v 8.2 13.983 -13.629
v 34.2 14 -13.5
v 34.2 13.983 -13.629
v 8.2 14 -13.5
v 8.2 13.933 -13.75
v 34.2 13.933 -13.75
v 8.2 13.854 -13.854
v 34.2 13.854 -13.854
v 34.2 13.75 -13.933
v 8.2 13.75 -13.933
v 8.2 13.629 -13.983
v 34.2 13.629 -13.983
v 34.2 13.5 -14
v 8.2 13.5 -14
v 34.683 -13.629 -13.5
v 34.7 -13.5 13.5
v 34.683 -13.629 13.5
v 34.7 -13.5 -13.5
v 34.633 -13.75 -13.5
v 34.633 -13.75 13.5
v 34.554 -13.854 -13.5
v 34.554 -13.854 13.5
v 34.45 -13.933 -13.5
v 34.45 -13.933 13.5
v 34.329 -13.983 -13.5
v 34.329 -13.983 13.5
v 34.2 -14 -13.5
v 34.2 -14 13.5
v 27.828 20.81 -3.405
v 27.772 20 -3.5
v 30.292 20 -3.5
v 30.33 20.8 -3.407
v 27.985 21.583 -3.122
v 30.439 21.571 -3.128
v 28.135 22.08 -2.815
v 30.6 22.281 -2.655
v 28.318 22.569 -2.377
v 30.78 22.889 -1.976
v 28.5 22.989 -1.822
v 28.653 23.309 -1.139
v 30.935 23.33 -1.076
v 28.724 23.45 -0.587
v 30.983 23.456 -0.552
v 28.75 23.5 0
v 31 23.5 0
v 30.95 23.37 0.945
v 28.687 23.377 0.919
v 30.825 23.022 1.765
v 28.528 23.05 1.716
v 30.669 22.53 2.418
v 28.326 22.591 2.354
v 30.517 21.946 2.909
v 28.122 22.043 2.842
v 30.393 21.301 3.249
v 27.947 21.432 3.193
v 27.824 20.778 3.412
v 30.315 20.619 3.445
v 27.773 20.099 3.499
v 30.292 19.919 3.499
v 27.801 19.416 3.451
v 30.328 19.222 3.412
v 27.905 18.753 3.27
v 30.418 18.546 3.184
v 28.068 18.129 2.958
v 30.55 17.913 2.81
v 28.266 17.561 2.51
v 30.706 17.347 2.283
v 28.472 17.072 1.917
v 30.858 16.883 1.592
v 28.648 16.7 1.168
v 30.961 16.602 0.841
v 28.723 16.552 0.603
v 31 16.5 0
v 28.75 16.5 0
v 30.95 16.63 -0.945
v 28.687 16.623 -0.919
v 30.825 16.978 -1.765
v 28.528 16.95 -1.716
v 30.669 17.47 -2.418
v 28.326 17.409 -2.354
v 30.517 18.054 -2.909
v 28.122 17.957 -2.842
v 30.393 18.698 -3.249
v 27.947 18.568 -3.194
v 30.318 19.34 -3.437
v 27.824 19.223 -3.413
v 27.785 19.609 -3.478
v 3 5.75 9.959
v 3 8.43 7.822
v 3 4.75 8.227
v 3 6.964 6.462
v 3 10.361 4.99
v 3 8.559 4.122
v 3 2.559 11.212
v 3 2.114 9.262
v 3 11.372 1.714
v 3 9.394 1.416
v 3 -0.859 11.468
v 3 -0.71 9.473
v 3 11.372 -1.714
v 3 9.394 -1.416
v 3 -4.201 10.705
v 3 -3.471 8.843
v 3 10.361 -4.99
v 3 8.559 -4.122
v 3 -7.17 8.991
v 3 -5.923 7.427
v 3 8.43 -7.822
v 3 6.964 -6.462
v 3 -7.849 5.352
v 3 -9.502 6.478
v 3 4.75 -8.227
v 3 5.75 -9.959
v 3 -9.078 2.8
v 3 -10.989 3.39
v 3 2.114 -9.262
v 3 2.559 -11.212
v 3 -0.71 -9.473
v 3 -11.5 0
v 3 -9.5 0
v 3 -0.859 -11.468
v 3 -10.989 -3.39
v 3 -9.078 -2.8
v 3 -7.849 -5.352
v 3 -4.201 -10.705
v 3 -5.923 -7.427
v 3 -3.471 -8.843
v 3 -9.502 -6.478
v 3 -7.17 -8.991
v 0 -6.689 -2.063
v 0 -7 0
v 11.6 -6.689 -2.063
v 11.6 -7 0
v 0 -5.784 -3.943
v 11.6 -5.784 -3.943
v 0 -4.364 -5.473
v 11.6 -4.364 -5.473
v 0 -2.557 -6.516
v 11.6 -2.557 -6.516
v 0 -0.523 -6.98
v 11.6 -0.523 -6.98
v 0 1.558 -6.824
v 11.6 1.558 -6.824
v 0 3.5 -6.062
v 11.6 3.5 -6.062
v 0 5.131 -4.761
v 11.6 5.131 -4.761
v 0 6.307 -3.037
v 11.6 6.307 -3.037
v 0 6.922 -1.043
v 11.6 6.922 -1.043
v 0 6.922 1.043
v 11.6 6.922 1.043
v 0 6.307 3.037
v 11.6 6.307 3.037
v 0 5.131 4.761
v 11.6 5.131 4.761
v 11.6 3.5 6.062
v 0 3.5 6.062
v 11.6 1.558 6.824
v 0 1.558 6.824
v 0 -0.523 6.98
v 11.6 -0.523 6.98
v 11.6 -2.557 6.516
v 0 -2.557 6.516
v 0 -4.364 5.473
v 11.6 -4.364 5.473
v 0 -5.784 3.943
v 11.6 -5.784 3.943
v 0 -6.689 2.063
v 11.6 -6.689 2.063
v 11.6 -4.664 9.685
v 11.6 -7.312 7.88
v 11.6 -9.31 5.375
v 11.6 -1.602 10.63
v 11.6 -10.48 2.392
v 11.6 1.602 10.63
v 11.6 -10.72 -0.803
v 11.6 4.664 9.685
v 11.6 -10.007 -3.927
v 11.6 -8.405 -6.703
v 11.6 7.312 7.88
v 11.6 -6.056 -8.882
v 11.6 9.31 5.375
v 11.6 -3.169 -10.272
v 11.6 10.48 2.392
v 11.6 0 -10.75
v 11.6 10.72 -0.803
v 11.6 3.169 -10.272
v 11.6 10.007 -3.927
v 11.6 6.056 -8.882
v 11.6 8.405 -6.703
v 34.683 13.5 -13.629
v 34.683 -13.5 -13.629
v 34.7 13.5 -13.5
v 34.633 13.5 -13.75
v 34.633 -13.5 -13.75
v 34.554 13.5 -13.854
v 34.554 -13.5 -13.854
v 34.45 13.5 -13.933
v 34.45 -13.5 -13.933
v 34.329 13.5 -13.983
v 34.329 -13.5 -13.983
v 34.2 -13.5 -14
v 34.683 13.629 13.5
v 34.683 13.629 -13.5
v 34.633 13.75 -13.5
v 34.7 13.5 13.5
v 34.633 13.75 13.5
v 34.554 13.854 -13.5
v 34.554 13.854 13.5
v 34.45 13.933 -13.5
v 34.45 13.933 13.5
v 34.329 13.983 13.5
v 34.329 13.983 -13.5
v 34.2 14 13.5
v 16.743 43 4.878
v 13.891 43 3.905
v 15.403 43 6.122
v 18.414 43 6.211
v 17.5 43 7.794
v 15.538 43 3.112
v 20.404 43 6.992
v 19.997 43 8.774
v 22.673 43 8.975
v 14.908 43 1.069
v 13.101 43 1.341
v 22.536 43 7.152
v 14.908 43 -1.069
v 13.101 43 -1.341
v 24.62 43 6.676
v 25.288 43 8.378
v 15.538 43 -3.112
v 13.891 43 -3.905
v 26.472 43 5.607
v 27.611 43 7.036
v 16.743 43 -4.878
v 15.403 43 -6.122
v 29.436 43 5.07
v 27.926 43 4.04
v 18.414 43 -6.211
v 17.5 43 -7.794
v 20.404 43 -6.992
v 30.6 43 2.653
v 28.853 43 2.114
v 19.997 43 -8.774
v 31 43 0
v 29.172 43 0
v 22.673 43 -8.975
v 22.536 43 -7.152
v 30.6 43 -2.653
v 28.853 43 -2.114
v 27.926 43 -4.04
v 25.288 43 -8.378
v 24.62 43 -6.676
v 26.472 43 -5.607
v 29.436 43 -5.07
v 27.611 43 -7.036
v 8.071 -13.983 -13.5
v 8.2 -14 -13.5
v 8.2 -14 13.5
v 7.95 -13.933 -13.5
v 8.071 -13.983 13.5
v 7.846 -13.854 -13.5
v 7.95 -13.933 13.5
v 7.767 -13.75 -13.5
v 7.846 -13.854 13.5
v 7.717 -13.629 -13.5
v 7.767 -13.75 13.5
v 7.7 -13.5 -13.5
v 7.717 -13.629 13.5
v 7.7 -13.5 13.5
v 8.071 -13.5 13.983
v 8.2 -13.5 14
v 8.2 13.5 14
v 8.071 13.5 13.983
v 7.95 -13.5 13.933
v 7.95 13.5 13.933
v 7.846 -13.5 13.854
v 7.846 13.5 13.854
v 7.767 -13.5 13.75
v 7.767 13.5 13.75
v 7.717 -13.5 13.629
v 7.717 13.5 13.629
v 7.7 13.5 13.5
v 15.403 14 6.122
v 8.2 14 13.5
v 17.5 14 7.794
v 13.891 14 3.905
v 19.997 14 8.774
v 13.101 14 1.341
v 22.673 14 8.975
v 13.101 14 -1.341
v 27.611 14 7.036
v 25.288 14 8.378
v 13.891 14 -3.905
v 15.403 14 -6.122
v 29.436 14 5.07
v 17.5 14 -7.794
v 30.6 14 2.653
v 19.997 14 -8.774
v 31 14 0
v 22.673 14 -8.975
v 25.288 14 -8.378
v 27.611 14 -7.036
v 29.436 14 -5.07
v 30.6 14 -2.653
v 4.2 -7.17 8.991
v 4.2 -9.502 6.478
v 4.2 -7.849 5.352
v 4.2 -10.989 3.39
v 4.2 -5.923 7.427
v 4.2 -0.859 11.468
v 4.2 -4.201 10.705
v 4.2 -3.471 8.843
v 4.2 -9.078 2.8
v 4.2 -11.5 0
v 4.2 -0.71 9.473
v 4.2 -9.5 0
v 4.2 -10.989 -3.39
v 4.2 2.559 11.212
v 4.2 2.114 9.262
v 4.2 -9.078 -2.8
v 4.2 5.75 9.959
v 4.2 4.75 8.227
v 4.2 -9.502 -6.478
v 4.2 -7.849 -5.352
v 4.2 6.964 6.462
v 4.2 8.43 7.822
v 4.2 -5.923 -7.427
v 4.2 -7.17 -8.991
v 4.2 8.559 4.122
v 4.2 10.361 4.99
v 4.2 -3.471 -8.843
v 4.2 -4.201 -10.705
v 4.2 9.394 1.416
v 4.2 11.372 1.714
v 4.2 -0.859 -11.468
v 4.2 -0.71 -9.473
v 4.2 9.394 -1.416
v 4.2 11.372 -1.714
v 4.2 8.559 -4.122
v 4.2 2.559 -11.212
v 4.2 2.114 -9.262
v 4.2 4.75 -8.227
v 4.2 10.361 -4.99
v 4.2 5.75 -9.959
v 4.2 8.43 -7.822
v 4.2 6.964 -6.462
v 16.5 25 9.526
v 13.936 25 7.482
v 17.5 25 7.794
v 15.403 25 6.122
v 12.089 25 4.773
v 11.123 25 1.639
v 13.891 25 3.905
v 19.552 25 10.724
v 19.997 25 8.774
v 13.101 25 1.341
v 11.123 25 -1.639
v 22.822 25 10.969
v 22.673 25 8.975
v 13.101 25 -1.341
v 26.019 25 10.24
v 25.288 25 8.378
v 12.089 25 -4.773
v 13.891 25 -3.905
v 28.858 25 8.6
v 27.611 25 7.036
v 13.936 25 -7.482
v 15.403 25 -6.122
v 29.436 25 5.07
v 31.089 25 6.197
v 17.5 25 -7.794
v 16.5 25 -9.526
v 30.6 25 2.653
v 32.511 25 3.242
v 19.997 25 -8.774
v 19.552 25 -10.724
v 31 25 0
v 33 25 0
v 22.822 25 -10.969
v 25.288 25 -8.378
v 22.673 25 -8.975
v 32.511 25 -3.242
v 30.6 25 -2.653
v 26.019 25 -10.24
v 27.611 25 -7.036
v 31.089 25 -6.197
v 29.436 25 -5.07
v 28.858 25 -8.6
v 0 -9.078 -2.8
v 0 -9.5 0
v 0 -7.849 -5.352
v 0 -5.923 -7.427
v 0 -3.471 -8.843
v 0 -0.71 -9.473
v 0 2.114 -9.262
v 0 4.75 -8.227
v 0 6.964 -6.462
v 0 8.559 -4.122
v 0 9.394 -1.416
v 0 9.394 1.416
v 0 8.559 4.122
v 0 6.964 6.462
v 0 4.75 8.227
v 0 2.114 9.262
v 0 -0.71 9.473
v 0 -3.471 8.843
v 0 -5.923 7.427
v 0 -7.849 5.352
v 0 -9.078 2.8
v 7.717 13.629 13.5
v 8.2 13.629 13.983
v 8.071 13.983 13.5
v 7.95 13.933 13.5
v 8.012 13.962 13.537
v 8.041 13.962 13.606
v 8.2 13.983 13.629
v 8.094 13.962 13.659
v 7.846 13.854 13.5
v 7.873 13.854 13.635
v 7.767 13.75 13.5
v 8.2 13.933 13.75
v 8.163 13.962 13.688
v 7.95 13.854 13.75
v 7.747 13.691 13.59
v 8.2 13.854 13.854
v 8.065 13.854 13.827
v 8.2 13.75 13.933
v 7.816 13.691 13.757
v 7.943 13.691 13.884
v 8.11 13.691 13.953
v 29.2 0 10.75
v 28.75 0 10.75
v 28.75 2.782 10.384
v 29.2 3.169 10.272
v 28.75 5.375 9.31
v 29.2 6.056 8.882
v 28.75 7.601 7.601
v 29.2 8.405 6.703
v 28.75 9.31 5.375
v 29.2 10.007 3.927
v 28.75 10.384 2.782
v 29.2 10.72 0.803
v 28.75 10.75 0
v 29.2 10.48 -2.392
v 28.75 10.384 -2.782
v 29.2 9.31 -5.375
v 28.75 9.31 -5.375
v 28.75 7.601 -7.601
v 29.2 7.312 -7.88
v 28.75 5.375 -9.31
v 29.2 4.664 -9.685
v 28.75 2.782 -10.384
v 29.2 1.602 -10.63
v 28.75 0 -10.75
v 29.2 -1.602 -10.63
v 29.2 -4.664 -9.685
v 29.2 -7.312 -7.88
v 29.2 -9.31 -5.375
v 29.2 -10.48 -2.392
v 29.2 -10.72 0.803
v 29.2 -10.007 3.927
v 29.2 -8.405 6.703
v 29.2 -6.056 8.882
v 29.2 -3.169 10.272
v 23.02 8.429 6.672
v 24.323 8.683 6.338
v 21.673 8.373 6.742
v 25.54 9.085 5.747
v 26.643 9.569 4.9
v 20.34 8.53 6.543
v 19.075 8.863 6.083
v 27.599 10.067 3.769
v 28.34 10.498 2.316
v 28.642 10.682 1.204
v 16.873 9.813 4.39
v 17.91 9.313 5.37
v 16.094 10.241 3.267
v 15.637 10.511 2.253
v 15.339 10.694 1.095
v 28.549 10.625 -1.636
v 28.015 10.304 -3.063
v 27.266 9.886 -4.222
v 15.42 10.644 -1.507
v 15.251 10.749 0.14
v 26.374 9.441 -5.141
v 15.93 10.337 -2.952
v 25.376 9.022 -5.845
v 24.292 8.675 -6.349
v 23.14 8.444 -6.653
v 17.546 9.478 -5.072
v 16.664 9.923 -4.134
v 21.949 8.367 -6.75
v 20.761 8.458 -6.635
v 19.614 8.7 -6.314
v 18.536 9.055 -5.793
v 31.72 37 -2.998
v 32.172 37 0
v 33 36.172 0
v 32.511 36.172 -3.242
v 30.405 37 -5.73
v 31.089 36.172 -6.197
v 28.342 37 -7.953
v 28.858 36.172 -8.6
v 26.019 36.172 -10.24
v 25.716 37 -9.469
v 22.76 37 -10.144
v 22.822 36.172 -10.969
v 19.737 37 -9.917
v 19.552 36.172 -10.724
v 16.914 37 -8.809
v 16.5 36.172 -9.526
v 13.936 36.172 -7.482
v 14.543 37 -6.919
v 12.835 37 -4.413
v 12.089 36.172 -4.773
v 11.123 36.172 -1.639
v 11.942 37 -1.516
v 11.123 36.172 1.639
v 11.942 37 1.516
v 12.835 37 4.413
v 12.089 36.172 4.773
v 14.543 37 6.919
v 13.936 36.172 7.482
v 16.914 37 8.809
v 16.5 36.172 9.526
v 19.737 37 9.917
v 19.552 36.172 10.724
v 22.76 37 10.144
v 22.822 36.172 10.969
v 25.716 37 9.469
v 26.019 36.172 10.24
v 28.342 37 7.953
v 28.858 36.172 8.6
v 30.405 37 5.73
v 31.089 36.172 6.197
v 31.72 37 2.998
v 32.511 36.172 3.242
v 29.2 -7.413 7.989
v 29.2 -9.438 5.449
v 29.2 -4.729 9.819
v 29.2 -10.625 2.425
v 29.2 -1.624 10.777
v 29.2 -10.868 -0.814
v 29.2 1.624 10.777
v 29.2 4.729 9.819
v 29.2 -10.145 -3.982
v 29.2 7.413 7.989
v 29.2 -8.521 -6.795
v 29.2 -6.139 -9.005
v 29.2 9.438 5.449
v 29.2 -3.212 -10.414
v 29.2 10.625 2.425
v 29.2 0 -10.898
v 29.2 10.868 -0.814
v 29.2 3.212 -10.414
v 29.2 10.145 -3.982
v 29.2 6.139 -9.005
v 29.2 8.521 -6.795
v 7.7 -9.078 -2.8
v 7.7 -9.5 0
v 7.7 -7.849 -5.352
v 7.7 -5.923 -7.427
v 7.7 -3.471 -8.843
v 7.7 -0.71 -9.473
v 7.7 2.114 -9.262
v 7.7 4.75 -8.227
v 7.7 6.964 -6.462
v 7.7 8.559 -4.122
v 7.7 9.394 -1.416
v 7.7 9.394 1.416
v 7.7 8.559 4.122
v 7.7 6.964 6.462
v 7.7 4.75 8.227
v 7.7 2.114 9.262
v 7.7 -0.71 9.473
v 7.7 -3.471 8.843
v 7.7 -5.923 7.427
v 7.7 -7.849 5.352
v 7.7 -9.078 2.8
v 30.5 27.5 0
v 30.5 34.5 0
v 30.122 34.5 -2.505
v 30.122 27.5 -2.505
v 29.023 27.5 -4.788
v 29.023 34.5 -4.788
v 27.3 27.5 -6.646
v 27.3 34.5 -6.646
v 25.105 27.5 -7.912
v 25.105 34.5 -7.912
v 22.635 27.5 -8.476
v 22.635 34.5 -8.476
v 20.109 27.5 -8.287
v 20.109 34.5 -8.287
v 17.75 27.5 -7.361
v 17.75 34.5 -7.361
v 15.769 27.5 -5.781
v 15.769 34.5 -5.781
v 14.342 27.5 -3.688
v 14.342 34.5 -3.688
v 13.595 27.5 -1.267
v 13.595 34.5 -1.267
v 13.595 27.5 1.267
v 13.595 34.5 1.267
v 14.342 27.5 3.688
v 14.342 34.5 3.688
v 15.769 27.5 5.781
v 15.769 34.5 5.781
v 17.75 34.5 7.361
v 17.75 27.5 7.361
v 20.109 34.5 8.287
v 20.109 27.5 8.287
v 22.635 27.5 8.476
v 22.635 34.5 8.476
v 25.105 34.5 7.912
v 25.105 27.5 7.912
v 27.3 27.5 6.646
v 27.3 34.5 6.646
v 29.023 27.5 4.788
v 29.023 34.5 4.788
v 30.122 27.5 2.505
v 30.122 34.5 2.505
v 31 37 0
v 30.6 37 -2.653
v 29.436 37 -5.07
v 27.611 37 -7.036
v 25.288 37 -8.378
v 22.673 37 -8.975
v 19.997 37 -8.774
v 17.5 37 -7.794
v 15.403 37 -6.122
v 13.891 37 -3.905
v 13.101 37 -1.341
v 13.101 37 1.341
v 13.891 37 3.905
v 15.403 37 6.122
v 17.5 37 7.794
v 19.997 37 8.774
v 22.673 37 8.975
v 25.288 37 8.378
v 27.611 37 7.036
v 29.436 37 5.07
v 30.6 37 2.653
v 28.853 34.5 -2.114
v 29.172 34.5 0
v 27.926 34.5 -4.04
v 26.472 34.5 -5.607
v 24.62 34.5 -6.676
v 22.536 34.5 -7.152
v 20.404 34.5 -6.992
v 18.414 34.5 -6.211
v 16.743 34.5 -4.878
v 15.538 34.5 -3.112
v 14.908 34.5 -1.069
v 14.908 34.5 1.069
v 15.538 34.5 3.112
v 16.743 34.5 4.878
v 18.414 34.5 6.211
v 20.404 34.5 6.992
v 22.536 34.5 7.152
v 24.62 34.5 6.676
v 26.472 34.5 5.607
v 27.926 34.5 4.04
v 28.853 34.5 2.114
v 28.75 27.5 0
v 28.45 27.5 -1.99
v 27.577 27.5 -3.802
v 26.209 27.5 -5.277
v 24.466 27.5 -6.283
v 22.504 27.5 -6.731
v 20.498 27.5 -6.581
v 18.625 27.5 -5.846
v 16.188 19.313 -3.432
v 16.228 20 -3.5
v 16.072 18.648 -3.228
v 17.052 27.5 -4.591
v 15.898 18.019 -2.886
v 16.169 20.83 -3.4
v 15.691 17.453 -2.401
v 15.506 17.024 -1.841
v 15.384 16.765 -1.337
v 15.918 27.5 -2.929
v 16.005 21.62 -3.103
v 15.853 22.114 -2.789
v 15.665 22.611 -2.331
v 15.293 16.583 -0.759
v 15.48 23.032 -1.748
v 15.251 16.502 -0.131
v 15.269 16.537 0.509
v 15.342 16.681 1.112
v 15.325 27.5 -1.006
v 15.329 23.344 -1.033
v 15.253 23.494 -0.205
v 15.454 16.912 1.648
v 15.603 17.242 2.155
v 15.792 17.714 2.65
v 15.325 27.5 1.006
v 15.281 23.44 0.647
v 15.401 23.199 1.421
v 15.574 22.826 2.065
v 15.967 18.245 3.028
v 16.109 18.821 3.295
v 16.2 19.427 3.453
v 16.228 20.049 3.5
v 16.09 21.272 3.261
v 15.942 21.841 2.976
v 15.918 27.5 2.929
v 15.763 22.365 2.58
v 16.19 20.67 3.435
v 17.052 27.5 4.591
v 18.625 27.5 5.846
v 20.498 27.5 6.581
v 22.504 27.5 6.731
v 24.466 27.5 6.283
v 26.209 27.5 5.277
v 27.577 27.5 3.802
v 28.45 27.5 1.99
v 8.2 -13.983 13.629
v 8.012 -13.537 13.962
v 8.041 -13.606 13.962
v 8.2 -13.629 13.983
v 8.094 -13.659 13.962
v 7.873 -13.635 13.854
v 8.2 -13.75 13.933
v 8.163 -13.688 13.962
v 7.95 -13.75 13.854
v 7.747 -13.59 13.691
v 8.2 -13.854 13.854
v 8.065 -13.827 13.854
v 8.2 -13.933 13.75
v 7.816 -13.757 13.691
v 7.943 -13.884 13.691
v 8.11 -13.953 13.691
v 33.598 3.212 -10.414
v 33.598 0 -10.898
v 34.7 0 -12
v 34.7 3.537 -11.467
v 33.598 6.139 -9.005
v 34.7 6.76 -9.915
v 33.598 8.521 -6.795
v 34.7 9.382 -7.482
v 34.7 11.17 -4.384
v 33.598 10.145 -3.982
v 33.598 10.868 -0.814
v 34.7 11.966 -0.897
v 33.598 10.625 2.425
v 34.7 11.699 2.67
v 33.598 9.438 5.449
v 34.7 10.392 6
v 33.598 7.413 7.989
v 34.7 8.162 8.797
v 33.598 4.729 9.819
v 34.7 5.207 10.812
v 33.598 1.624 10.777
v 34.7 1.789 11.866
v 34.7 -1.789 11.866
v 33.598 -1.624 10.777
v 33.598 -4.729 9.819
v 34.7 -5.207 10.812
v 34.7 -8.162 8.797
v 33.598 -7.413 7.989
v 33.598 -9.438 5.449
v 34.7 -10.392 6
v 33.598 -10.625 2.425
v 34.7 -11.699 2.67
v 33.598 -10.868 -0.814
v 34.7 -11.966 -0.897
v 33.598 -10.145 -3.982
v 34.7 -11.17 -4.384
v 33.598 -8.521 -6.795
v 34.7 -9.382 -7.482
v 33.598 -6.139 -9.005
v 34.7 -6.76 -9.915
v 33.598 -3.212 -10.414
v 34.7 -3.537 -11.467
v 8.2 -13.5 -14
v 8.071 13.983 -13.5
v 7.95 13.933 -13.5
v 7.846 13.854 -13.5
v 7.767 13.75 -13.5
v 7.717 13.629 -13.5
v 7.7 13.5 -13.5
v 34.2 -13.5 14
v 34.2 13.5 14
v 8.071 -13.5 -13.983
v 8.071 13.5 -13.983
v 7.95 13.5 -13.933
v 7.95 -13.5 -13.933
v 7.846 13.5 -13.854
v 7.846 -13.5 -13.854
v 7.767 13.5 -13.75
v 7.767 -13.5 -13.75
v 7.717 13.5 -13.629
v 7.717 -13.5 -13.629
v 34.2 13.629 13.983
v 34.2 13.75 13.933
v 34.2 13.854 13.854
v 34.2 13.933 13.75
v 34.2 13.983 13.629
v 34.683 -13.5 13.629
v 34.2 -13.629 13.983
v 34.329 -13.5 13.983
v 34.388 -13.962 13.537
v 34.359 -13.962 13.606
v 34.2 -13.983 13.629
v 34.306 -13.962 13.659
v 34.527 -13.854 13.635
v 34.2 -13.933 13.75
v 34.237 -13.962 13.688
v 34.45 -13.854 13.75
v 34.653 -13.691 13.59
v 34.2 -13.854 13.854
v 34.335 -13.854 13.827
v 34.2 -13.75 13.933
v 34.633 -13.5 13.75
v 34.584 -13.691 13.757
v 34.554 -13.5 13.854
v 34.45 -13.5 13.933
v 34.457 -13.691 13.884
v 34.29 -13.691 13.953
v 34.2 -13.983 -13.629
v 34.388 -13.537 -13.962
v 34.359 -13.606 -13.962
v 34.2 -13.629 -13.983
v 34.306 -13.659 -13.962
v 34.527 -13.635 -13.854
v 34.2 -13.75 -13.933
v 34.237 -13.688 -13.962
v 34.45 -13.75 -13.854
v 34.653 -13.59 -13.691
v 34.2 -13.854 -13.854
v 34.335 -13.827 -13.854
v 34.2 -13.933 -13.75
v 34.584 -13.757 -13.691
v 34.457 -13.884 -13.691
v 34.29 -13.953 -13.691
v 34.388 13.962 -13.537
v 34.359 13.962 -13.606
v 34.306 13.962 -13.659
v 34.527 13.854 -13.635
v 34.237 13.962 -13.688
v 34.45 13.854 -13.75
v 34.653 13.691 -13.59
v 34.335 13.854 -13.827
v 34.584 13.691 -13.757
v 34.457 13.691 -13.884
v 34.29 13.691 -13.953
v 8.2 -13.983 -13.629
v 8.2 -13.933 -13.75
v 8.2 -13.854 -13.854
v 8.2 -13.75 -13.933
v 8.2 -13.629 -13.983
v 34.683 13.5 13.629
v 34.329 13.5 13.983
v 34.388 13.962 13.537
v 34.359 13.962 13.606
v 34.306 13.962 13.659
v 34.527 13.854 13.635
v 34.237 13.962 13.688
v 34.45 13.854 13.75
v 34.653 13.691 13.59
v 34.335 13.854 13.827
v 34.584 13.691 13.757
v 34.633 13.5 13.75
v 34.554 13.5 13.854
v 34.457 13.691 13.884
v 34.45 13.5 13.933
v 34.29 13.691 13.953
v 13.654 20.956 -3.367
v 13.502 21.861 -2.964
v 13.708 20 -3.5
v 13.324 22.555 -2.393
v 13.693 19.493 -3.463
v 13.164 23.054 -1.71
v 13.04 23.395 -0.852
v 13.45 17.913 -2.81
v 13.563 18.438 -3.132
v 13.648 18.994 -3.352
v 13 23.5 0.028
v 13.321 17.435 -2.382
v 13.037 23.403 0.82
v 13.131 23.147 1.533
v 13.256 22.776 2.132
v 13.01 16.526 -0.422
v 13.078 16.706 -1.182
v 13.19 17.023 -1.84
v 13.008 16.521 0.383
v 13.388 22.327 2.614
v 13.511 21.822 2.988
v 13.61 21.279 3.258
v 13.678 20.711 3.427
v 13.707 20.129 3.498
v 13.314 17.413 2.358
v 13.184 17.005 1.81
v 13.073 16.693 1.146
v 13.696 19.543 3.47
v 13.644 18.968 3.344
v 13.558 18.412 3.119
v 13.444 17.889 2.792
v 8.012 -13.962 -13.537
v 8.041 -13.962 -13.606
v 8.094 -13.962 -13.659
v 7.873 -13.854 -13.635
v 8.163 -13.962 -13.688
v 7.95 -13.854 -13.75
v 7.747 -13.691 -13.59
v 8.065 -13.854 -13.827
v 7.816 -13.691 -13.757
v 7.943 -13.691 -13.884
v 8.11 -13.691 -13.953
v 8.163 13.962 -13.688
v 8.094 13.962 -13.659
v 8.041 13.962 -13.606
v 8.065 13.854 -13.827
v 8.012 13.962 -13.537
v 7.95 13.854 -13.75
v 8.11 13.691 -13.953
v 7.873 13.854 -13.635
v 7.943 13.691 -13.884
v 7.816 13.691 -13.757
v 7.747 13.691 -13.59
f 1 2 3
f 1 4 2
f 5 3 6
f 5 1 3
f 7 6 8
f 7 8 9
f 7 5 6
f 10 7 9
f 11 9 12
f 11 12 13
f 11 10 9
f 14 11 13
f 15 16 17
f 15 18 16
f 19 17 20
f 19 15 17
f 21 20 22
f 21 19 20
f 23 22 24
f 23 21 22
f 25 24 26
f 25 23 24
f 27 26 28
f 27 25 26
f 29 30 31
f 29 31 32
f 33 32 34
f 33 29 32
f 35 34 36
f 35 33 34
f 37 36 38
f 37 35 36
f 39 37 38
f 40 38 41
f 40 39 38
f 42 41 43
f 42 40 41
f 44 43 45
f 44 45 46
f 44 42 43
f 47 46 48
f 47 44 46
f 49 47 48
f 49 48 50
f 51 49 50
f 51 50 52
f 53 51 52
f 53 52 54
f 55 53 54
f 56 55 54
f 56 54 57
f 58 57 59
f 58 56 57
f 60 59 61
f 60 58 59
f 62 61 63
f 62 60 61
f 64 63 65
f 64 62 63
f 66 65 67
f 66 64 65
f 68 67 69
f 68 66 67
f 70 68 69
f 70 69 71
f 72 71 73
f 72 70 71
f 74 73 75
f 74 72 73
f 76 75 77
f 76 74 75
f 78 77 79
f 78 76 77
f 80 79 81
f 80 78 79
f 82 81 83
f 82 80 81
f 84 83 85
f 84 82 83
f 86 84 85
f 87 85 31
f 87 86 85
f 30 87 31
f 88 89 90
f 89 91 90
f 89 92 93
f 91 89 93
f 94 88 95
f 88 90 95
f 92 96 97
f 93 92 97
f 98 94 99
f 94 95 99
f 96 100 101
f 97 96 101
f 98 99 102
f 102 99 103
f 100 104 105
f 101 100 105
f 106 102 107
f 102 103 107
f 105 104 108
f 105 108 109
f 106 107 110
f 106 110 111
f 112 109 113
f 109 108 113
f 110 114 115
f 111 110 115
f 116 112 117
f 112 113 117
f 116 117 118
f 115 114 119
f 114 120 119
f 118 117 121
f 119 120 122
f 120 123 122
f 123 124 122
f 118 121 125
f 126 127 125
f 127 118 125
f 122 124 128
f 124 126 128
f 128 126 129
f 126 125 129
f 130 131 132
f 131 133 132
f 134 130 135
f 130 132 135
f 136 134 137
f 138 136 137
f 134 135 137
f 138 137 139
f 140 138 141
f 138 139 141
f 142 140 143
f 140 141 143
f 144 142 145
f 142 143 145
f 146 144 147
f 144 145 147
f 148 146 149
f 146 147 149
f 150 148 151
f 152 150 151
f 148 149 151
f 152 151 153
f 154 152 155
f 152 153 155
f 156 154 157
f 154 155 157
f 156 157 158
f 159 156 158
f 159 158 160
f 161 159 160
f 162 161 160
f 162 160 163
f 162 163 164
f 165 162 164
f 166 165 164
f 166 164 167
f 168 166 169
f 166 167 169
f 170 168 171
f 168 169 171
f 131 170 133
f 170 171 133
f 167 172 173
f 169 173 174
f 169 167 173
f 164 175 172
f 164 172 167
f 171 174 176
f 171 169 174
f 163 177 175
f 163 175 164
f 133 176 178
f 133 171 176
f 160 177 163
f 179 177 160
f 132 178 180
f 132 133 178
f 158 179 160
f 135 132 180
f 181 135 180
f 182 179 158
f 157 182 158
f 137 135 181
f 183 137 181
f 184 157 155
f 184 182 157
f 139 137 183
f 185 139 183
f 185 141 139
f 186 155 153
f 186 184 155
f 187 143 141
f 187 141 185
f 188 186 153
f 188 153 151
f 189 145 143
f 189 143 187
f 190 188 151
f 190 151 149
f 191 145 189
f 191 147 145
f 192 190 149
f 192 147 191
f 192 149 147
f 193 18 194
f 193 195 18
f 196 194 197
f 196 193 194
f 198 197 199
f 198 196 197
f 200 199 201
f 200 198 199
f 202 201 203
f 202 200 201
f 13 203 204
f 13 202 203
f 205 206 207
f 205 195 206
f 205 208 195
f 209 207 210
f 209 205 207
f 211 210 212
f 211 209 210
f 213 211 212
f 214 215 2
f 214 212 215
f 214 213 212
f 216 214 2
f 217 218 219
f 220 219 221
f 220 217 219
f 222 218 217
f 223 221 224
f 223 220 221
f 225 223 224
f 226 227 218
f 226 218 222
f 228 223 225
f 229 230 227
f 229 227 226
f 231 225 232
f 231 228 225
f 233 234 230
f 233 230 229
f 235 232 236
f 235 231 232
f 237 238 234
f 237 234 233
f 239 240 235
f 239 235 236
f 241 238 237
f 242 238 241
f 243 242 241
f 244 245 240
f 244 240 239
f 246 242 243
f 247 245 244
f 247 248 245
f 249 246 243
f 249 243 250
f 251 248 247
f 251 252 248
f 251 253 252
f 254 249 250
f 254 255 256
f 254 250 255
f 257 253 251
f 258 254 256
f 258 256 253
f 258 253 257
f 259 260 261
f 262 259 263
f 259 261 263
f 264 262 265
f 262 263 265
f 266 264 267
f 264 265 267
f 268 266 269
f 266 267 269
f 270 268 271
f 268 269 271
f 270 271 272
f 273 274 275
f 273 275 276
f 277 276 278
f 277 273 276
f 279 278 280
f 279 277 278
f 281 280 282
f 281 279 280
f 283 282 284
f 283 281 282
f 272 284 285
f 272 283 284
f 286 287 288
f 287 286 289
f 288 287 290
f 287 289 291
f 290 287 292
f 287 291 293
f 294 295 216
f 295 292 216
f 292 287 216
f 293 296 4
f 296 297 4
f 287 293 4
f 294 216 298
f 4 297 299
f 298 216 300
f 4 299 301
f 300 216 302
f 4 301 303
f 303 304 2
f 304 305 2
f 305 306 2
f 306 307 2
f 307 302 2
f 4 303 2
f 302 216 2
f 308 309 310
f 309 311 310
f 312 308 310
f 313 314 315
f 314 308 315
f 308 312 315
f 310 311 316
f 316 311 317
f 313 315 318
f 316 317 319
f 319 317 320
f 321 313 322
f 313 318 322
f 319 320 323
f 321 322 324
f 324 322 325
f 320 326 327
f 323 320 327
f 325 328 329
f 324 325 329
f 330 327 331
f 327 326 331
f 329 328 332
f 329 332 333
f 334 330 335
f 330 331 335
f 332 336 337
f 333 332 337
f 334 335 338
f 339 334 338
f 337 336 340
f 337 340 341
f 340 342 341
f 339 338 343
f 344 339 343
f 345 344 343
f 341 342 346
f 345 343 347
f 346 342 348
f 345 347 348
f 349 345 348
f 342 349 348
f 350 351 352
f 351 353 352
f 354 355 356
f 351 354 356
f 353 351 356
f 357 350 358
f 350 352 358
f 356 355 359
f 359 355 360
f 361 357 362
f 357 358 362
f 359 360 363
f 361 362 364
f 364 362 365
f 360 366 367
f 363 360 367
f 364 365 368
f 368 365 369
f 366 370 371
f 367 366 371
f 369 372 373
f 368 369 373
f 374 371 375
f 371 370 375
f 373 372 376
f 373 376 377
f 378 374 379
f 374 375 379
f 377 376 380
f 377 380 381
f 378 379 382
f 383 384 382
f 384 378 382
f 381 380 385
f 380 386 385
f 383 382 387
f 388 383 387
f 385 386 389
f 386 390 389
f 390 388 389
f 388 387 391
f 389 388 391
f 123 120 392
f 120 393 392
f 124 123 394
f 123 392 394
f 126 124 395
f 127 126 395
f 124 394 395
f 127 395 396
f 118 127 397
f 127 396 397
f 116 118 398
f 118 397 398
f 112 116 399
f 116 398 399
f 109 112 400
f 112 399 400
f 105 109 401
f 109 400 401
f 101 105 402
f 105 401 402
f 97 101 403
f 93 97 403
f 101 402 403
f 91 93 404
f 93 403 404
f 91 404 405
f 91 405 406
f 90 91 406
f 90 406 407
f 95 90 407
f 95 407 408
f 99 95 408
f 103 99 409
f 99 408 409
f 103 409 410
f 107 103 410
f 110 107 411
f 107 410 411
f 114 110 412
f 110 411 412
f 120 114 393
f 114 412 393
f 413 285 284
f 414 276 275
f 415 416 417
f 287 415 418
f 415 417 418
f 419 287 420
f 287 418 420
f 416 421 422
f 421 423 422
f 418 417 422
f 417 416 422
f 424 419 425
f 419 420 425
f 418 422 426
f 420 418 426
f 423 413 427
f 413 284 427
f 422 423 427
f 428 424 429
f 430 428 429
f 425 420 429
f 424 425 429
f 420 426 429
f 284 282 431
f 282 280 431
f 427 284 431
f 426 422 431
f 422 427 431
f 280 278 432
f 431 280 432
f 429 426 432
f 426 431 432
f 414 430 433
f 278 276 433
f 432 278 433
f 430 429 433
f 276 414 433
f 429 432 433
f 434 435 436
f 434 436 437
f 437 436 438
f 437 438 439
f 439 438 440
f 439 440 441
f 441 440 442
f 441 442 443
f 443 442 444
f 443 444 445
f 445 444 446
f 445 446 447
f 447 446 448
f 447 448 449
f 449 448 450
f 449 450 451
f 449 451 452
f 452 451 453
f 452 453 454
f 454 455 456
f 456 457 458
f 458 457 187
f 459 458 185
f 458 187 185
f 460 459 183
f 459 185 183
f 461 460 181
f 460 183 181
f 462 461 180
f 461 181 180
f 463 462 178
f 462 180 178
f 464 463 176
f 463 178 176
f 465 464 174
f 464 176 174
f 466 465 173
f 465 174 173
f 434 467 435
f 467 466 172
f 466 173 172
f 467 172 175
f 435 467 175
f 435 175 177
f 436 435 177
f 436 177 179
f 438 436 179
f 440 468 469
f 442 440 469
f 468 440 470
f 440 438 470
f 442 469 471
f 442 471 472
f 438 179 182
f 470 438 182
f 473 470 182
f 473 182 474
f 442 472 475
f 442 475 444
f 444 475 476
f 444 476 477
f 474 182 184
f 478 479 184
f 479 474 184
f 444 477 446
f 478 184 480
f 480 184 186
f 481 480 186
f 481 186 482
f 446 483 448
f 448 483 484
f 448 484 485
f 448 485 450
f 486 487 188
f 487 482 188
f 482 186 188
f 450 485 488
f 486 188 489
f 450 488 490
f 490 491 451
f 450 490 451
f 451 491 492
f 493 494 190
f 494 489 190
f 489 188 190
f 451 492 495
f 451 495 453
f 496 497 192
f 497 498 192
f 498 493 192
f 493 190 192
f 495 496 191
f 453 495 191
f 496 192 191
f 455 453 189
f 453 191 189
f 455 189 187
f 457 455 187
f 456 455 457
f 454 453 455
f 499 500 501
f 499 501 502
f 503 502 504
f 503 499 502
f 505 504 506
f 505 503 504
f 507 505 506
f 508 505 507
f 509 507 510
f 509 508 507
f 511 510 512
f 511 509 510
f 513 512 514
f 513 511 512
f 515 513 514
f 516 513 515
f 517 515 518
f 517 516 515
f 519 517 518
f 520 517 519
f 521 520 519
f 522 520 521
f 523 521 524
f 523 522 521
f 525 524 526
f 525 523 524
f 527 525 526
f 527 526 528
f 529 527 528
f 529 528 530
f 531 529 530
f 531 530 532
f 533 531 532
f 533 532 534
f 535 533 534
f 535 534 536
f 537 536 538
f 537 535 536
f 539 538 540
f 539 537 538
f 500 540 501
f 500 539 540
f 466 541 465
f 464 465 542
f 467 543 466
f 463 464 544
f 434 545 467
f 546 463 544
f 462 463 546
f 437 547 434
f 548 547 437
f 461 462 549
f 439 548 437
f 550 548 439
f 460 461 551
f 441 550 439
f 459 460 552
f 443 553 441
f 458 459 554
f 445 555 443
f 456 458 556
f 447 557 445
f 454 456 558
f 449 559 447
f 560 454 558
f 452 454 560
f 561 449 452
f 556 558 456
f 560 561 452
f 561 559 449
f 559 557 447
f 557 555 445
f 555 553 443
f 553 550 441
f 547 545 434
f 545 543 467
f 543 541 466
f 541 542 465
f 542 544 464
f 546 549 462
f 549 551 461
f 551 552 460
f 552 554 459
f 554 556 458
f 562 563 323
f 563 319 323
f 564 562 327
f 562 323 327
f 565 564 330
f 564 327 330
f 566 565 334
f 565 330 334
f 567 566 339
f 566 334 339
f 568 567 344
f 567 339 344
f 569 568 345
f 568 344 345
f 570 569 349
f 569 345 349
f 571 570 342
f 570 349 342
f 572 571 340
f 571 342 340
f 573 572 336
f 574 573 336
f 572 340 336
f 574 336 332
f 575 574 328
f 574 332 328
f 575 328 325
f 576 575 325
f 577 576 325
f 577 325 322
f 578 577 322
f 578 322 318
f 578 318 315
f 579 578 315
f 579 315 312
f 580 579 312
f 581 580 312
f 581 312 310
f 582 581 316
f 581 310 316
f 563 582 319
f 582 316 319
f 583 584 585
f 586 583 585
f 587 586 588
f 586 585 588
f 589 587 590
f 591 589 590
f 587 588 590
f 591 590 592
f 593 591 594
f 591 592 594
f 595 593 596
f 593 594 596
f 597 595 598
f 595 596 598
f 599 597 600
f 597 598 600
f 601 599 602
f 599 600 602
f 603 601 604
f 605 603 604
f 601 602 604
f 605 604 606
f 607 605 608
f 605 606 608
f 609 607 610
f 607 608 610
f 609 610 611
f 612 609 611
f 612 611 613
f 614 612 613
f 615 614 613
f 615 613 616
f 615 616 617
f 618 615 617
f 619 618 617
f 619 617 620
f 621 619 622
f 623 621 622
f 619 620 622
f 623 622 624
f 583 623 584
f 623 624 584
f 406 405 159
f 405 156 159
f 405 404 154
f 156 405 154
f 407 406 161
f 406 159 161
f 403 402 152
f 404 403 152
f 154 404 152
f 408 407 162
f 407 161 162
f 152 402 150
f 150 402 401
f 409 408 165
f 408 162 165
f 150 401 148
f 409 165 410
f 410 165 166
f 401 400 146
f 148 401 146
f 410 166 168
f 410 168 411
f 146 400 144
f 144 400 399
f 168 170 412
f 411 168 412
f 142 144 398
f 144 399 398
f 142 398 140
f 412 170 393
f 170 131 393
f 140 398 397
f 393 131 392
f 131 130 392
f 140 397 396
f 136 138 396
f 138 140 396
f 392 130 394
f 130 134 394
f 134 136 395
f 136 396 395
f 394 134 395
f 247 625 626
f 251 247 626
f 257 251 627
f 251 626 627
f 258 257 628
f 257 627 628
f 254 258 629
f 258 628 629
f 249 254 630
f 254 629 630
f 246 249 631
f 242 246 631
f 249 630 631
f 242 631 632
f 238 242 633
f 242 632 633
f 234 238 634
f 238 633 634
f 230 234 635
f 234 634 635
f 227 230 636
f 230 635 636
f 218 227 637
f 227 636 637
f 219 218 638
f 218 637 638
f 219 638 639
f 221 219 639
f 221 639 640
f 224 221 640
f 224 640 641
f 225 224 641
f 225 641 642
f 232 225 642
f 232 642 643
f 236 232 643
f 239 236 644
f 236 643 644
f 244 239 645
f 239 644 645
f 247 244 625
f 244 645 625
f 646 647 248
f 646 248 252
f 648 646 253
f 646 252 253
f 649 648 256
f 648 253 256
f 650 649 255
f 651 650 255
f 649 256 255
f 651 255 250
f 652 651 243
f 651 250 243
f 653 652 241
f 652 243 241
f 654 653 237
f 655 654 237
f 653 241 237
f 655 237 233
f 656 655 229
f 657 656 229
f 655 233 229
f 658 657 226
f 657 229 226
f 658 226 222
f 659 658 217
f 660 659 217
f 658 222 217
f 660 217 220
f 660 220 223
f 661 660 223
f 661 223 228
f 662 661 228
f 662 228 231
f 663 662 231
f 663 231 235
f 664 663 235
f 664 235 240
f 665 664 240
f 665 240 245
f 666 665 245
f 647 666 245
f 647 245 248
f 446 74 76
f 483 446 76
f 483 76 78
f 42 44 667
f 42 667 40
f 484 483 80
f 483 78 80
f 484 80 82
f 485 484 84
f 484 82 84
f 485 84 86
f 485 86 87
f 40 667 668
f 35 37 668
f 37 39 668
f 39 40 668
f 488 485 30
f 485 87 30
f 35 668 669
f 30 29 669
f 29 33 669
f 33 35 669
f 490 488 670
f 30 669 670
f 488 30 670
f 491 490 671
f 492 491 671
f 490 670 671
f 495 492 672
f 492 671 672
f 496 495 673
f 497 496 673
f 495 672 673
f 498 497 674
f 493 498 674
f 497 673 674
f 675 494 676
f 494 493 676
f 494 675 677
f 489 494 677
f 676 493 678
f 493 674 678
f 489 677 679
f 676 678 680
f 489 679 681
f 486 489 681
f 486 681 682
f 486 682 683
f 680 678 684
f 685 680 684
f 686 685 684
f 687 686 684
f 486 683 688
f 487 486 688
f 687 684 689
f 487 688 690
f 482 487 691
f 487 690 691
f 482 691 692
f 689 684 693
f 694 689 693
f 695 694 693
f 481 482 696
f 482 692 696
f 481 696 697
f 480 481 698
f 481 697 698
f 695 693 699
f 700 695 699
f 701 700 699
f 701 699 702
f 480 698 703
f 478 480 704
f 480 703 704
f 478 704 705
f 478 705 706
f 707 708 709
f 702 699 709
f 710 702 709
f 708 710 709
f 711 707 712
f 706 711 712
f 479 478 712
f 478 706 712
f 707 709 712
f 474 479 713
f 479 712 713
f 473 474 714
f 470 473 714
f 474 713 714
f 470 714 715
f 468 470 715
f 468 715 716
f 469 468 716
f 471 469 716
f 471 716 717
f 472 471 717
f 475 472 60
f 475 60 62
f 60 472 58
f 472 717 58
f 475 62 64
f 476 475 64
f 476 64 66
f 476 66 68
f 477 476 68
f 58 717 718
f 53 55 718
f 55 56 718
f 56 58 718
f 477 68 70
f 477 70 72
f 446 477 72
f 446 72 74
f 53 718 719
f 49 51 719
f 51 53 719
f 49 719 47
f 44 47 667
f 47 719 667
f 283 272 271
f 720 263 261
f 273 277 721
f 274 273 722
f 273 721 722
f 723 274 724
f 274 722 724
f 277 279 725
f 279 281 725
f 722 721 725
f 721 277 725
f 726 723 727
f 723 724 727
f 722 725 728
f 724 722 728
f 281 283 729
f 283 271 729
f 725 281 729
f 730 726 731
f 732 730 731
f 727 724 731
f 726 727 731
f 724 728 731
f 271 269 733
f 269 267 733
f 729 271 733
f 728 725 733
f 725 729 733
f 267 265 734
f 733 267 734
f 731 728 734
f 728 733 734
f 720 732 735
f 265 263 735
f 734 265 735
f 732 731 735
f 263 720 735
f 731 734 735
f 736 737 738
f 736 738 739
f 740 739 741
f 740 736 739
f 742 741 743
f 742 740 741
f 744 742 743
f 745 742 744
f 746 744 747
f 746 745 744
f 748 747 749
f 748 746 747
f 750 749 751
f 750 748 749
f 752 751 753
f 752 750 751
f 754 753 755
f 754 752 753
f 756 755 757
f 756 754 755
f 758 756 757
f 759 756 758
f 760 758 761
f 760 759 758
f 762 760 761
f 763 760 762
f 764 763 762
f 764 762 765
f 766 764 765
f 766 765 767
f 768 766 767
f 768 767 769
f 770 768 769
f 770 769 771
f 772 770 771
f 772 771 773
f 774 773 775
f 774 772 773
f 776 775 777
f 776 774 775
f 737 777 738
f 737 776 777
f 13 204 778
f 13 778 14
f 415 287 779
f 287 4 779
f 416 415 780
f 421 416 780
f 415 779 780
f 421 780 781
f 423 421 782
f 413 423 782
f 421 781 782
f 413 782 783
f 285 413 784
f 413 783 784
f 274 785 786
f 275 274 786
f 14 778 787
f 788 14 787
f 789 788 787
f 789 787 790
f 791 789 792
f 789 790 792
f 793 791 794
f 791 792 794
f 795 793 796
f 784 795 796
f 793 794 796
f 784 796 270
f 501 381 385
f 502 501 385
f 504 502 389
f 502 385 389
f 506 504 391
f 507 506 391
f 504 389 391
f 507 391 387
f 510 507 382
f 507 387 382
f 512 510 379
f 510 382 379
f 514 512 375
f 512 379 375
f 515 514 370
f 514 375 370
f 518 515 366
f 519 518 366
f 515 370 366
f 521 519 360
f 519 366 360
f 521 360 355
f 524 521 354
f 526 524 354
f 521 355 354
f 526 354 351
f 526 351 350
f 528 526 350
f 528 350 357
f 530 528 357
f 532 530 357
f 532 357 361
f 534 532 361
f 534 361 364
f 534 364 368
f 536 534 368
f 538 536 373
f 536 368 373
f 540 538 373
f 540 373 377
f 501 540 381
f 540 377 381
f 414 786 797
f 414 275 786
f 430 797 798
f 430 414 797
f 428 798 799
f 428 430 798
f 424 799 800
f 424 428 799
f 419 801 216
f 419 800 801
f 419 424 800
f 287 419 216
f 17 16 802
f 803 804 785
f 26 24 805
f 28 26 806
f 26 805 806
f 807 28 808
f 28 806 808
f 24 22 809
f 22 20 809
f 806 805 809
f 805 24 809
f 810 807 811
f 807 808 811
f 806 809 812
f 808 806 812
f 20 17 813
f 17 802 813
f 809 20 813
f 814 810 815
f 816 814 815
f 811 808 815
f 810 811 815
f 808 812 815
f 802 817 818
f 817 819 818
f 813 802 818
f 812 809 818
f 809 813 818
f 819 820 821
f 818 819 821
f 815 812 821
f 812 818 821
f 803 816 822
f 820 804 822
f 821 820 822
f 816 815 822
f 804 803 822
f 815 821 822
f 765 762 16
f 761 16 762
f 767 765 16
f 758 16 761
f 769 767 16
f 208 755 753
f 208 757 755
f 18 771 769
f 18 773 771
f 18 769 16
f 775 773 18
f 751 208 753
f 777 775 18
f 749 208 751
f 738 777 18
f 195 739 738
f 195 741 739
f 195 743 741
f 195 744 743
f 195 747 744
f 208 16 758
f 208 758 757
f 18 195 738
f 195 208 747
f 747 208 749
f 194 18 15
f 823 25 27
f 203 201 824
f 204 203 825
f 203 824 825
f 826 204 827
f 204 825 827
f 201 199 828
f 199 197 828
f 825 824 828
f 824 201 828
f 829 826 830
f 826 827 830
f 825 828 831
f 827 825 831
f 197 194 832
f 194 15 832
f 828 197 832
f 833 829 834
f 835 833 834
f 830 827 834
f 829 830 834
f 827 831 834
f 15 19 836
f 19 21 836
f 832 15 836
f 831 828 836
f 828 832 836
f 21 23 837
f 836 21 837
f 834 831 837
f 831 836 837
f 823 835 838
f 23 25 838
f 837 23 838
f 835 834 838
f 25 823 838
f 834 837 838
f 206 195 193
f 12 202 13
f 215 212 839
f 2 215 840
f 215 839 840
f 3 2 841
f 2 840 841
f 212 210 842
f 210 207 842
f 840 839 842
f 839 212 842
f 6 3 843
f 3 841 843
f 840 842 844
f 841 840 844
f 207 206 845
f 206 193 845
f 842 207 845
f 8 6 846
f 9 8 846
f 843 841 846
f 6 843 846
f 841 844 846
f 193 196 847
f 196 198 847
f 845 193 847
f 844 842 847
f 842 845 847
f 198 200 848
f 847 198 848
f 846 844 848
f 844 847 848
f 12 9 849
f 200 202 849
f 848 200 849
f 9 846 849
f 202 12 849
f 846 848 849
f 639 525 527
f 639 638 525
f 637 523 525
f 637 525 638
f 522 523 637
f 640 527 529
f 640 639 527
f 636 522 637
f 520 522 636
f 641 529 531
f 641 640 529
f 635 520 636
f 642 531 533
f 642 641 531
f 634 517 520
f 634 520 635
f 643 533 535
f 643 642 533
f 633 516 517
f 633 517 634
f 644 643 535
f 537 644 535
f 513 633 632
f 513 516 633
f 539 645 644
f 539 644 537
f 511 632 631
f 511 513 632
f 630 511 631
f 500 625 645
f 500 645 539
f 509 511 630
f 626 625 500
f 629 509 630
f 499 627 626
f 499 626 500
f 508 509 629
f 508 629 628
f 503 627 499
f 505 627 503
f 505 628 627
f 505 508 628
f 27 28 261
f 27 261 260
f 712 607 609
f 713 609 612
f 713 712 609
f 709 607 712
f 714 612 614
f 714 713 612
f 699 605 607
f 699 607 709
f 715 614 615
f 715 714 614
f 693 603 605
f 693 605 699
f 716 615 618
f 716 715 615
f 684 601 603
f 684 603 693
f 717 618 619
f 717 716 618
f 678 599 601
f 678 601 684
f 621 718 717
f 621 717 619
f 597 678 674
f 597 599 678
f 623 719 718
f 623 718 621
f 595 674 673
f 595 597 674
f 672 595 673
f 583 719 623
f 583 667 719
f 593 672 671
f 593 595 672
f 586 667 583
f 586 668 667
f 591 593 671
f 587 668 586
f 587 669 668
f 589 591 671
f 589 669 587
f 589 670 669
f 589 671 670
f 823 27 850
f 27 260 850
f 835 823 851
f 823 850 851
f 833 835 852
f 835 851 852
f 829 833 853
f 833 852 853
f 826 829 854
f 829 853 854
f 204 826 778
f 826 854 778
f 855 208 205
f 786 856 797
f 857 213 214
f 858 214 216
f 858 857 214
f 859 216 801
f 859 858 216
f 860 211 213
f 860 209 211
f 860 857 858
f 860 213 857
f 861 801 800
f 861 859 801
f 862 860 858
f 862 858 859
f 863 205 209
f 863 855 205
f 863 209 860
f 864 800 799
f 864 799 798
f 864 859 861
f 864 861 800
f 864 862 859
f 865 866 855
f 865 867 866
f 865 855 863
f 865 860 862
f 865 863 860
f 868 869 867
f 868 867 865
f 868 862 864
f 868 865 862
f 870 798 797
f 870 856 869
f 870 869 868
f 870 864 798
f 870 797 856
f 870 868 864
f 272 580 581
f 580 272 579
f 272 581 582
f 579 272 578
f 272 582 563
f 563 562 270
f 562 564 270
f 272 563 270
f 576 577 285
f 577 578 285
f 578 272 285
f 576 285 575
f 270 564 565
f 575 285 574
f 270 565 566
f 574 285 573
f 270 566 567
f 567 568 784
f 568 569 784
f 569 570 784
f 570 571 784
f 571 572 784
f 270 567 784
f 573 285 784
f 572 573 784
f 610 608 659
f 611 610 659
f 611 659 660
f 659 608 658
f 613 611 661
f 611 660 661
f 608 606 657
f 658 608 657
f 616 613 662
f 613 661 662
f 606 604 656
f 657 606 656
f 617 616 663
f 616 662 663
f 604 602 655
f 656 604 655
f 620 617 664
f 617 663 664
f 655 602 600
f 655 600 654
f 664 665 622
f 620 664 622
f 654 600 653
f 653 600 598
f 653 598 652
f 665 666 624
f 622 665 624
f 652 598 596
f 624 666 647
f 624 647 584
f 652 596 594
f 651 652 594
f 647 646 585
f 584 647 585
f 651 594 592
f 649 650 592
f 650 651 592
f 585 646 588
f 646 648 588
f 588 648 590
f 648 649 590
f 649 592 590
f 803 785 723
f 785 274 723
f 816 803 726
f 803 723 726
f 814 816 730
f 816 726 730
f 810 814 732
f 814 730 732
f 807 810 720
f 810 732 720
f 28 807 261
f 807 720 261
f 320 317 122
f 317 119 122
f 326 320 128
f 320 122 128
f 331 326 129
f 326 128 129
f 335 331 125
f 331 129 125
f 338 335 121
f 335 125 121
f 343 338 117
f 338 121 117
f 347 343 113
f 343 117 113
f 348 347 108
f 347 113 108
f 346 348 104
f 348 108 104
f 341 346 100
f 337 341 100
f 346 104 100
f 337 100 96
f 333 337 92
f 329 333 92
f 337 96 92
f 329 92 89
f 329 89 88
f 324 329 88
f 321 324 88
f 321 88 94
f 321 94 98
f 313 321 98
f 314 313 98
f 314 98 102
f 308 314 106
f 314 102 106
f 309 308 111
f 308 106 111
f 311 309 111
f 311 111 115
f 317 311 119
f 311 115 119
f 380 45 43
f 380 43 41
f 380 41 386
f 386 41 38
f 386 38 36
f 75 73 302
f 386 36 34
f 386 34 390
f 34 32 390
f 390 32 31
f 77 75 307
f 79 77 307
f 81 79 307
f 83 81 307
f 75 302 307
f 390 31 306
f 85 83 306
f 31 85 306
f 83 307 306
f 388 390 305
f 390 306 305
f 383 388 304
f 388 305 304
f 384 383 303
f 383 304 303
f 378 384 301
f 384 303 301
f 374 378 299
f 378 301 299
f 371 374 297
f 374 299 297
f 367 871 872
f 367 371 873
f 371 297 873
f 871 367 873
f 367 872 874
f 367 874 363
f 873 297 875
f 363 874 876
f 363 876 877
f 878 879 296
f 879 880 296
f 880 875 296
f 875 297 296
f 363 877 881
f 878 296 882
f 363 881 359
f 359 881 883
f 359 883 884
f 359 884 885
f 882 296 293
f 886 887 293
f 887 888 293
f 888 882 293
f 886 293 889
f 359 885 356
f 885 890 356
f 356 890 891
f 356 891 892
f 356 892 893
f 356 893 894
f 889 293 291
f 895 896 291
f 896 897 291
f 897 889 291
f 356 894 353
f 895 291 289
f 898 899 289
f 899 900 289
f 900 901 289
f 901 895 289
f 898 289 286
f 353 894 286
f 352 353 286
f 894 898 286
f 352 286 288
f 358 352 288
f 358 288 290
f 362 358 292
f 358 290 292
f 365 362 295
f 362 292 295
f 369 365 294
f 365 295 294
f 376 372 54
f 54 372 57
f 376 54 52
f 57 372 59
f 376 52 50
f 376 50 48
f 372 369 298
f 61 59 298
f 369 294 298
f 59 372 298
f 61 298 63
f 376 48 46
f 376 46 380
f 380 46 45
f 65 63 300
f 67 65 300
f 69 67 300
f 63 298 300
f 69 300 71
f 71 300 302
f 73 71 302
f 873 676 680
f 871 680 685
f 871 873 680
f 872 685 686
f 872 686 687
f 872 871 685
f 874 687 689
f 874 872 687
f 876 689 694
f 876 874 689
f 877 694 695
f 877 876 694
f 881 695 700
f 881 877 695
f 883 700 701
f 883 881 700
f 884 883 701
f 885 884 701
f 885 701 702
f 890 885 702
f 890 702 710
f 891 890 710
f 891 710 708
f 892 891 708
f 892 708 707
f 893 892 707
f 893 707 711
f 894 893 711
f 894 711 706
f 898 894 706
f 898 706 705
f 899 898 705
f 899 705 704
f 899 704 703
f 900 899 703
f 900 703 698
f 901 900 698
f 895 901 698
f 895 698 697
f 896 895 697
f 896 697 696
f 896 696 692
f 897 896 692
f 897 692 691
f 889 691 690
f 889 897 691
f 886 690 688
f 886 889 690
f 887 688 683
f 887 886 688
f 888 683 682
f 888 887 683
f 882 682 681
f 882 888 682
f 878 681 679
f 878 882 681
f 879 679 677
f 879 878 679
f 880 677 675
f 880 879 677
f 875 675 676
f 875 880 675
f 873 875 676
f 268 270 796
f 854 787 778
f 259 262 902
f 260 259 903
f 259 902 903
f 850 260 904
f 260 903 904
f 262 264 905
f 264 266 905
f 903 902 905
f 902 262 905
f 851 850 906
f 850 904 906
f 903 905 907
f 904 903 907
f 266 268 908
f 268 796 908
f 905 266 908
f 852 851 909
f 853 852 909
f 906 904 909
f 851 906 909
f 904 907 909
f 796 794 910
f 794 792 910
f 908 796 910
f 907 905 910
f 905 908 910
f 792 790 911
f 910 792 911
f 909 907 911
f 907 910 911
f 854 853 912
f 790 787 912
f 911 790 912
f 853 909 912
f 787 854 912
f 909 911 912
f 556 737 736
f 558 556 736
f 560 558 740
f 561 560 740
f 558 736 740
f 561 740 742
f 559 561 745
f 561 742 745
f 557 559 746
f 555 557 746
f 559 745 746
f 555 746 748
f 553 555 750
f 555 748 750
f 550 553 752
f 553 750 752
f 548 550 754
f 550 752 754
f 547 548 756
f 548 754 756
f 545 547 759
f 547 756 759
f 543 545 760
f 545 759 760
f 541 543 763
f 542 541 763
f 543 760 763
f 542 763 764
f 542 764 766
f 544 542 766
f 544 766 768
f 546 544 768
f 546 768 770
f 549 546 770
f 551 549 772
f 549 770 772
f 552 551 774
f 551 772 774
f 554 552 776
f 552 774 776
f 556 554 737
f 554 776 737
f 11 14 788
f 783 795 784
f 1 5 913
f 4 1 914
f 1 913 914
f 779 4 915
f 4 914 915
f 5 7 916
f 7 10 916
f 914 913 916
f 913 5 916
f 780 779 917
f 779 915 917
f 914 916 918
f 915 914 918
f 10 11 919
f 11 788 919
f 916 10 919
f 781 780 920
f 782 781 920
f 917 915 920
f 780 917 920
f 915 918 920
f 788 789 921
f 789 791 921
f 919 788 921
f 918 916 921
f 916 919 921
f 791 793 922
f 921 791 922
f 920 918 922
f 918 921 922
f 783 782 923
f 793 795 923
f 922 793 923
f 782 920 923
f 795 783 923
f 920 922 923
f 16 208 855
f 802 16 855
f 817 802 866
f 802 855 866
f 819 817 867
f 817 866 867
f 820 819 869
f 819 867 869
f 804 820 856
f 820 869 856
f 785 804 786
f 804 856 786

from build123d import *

# Parameters (mm, degrees)
SKETCH_2_R           = 9
EXTRUDE_1_DEPTH      = 25
SKETCH_3_R           = 11
EXTRUDE_2_DEPTH      = 12
SKETCH_4_R           = 9
EXTRUDE_3_DEPTH      = 6
SKETCH_5_R           = 10.75
CUT_EXTRUDE_1_DEPTH  = 23.1
CUT_EXTRUDE_START    = -8.5
SKETCH_6_R           = 8.5
CUT_EXTRUDE_2_DEPTH  = 7
CUT_EXTRUDE_3_REACH  = 43.5
SKETCH_8_R           = 6.75
SKETCH_9_R           = 3.5
CUT_EXTRUDE_4_DEPTH  = 35.7000001
SKETCH_10_R          = 10.75
EXTRUDE_4_DEPTH      = 5.95
CHAMFER_1_SIZE       = 0.828
SKETCH_12_W          = 28
SKETCH_12_H          = 28
SKETCH_12_R          = 13
EXTRUDE_5_DEPTH      = 27
CUT_EXTRUDE_5_REACH  = 30
SKETCH_13_R          = 6.75
CUT_EXTRUDE_6_REACH  = 59
SKETCH_14_R          = 7.172
SKETCH_16_R          = 10.8985
CUT_EXTRUDE_7_DEPTH  = 5.5
CHAMFER_3_SIZE       = 1.1015
CUT_EXTRUDE_11_REACH = 7.95
SKETCH_18_R          = 10.75
FILLET_1_R           = 0.5


with BuildPart() as part:
    # Эскиз1 → Повернуть1 (revolve)
    with BuildSketch(Plane.XY):
        Polygon((0, -7), (11.6, -7), (11.6, 0), (34.7, 0), (34.7, -10.5), (34.7, -14), (7.7, -14), (7.7, -9.5), (4.2, -9.5), (4.2, -11.5), (3, -11.5), (3, -9.5), (0, -9.5), align=None)
    revolve(axis=Axis((0, 0, 0), (1, 0, 0)))

    # Эскиз2 → Бобышка-Вытянуть1 (add)
    with BuildSketch(Plane(origin=(0, 0, 0), x_dir=(1, 0, 0), z_dir=(0, 1, 0))):
        with Locations((22, 0)):
            Circle(SKETCH_2_R)
    extrude(amount=EXTRUDE_1_DEPTH)

    # Эскиз3 → Бобышка-Вытянуть2 (add)
    with BuildSketch(Plane(origin=(0, 25, 0), x_dir=(1, 0, 0), z_dir=(0, 1, 0))):
        with Locations((22, 0)):
            Circle(SKETCH_3_R)
    extrude(amount=EXTRUDE_2_DEPTH)

    # Эскиз4 → Бобышка-Вытянуть3 (add)
    with BuildSketch(Plane(origin=(0, 37, 0), x_dir=(1, 0, 0), z_dir=(0, 1, 0))):
        with Locations((22, 0)):
            Circle(SKETCH_4_R)
    extrude(amount=EXTRUDE_3_DEPTH)

    # Эскиз5 → Вырез-Вытянуть1 (cut)
    with BuildSketch(Plane(origin=(34.7, 0, 0), x_dir=(0, 0, -1), z_dir=(1, 0, 0))):
        Circle(SKETCH_5_R)
    extrude(amount=-CUT_EXTRUDE_1_DEPTH, mode=Mode.SUBTRACT)

    # Эскиз6 → Вырез-Вытянуть2 (cut)
    with BuildSketch(Plane(origin=(0, 43, 0), x_dir=(1, 0, 0), z_dir=(0, 1, 0)).offset(CUT_EXTRUDE_START)):
        with Locations((22, 0)):
            Circle(SKETCH_6_R)
    extrude(amount=-CUT_EXTRUDE_2_DEPTH, mode=Mode.SUBTRACT)

    # Эскиз8 → Вырез-Вытянуть3 (cut, up to next)
    with BuildSketch(Plane(origin=(0, 27.5, 0), x_dir=(1, 0, 0), z_dir=(0, 1, 0)), mode=Mode.PRIVATE) as cut_extrude_3_sk1:
        with Locations((22, 0)):
            Circle(SKETCH_8_R)
    cut_extrude_3_tool1 = extrude(cut_extrude_3_sk1.sketch, amount=-CUT_EXTRUDE_3_REACH, mode=Mode.PRIVATE) & part.part
    add(cut_extrude_3_tool1.solids().sort_by_distance((22, 27.5, 0))[0], mode=Mode.SUBTRACT)

    # Эскиз9 → Вырез-Вытянуть4 (cut, through all)
    with BuildSketch(Plane(origin=(0, 0, 0), x_dir=(0, 0, -1), z_dir=(1, 0, 0))):
        with Locations((0, 20)):
            Circle(SKETCH_9_R)
    extrude(amount=CUT_EXTRUDE_4_DEPTH, mode=Mode.SUBTRACT)

    # Эскиз10 → Бобышка-Вытянуть4 (add)
    with BuildSketch(Plane(origin=(34.7, 0, 0), x_dir=(0, 0, -1), z_dir=(1, 0, 0))):
        Circle(SKETCH_10_R)
    extrude(amount=-EXTRUDE_4_DEPTH)

    # Фаска1
    chamfer_1_edges = [part.edges().sort_by_distance(p)[0] for p in [
        (11, 37, 0),
    ]]
    chamfer(chamfer_1_edges, length=CHAMFER_1_SIZE)

    # Эскиз12 → Бобышка-Вытянуть5 (add)
    with BuildSketch(Plane(origin=(34.7, 0, 0), x_dir=(0, 0, -1), z_dir=(1, 0, 0))):
        Rectangle(SKETCH_12_W, SKETCH_12_H)
        Circle(SKETCH_12_R, mode=Mode.SUBTRACT)
    extrude(amount=-EXTRUDE_5_DEPTH)

    # Эскиз13 → Вырез-Вытянуть5 (cut, up to next)
    with BuildSketch(Plane(origin=(0, 14, 0), x_dir=(1, 0, 0), z_dir=(0, 1, 0)), mode=Mode.PRIVATE) as cut_extrude_5_sk1:
        with Locations((22, 0)):
            Circle(SKETCH_13_R)
    cut_extrude_5_tool1 = extrude(cut_extrude_5_sk1.sketch, amount=-CUT_EXTRUDE_5_REACH, mode=Mode.PRIVATE) & part.part
    add(cut_extrude_5_tool1.solids().sort_by_distance((22, 14, 0))[0], mode=Mode.SUBTRACT)

    # Эскиз14 → Вырез-Вытянуть6 (cut, up to next)
    with BuildSketch(Plane(origin=(0, 43, 0), x_dir=(1, 0, 0), z_dir=(0, 1, 0)), mode=Mode.PRIVATE) as cut_extrude_6_sk1:
        with Locations((22, 0)):
            Circle(SKETCH_14_R)
    cut_extrude_6_tool1 = extrude(cut_extrude_6_sk1.sketch, amount=-CUT_EXTRUDE_6_REACH, mode=Mode.PRIVATE) & part.part
    add(cut_extrude_6_tool1.solids().sort_by_distance((22, 43, 0))[0], mode=Mode.SUBTRACT)

    # Эскиз16 → Вырез-Вытянуть7 (cut)
    with BuildSketch(Plane(origin=(34.7, 0, 0), x_dir=(0, 0, -1), z_dir=(1, 0, 0))):
        Circle(SKETCH_16_R)
    extrude(amount=-CUT_EXTRUDE_7_DEPTH, mode=Mode.SUBTRACT)

    # Фаска3
    chamfer_3_edges = [part.edges().sort_by_distance(p)[0] for p in [
        (34.7, 0, 10.8985),
    ]]
    chamfer(chamfer_3_edges, length=CHAMFER_3_SIZE)

    # Эскиз18 → Вырез-Вытянуть11 (cut, up to next)
    with BuildSketch(Plane.ZY.offset(-28.75), mode=Mode.PRIVATE) as cut_extrude_11_sk1:
        Circle(SKETCH_18_R)
    cut_extrude_11_tool1 = extrude(cut_extrude_11_sk1.sketch, amount=-CUT_EXTRUDE_11_REACH, mode=Mode.PRIVATE) & part.part
    add(cut_extrude_11_tool1.solids().sort_by_distance((28.75, 0, 0))[0], mode=Mode.SUBTRACT)

    # Скругление1
    fillet_1_edges = [part.edges().sort_by_distance(p)[0] for p in [
        (34.7, 0, 14),
        (34.7, -14, 0),
        (34.7, 0, -14),
        (34.7, 14, 0),
        (7.7, 0, -14),
        (21.2, 14, -14),
        (7.7, -14, 0),
        (21.2, -14, -14),
        (7.7, 0, 14),
        (21.2, -14, 14),
        (7.7, 14, 0),
        (21.2, 14, 14),
    ]]
    fillet(fillet_1_edges, radius=FILLET_1_R)


solid = part.part
